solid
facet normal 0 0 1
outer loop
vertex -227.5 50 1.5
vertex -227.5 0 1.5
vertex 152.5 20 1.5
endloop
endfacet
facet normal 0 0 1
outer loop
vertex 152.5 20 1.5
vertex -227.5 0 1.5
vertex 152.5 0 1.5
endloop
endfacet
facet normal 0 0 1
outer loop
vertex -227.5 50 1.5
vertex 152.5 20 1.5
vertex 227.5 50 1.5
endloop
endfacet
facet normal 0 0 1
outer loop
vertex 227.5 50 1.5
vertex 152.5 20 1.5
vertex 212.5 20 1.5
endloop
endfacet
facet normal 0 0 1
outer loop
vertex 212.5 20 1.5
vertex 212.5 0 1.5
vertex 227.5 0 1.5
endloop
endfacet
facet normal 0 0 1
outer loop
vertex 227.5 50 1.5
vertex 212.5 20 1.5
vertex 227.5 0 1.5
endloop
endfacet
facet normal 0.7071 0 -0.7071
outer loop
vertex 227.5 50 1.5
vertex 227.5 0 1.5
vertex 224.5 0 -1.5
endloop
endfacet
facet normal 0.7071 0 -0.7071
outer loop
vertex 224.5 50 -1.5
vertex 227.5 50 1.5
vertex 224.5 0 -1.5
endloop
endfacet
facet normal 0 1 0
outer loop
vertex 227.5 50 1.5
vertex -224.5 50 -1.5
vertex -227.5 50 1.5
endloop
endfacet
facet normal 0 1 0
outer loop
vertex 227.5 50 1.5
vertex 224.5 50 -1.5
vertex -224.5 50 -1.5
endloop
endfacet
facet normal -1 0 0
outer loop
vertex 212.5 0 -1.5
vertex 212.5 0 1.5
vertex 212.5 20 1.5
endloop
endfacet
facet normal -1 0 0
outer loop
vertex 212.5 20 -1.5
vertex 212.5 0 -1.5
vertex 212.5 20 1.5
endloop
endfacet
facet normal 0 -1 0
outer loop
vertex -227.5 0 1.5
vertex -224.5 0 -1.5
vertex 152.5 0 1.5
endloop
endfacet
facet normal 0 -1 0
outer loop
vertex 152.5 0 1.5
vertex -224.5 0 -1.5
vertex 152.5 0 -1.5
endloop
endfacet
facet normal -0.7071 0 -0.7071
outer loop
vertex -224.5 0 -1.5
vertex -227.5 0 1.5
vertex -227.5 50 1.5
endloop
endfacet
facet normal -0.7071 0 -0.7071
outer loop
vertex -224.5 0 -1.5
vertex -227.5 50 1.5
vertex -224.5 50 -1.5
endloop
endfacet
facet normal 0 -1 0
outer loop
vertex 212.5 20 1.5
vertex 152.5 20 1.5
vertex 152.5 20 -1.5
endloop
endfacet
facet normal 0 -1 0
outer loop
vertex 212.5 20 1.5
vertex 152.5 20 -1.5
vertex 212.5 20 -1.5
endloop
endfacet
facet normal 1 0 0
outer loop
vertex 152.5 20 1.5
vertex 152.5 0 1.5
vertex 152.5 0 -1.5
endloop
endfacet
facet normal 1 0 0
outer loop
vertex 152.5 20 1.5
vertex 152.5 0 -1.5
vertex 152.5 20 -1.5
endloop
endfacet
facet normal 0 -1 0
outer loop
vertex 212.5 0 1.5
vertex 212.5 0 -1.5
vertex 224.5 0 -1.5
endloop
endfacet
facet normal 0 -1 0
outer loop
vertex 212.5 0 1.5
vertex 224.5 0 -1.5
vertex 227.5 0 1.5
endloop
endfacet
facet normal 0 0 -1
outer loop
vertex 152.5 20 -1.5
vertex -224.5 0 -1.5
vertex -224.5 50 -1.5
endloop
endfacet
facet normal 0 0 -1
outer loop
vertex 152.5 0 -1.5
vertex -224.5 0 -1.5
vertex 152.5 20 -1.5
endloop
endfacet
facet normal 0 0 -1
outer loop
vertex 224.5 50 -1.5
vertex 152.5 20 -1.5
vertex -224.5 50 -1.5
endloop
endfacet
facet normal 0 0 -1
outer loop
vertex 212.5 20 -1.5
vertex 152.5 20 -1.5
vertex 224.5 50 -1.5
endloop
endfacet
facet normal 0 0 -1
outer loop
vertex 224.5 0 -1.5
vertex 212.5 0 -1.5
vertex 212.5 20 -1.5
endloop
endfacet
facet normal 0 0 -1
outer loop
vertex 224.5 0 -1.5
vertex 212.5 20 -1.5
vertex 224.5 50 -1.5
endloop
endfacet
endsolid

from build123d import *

# Parameters (mm, degrees)
SKETCH1_W           = 455
SKETCH1_H           = 3
BOSS_EXTRUDE1_DEPTH = 50
SKETCH2_W           = 60
SKETCH2_H           = 20
CUT_EXTRUDE1_DEPTH  = 55
CUT_EXTRUDE2_DEPTH  = 233.934540161


with BuildPart() as part:
    # Sketch1 → Boss-Extrude1 (new body)
    with BuildSketch(Plane(origin=(0, 0, 0), x_dir=(1, 0, 0), z_dir=(0, 1, 0))):
        Rectangle(SKETCH1_W, SKETCH1_H)
    extrude(amount=BOSS_EXTRUDE1_DEPTH)

    # Sketch2 → Cut-Extrude1 (cut)
    with BuildSketch(Plane.XY.offset(1.5)):
        with Locations((182.5, 10)):
            Rectangle(SKETCH2_W, SKETCH2_H)
    extrude(amount=-CUT_EXTRUDE1_DEPTH, mode=Mode.SUBTRACT)

    # Sketch3 → Cut-Extrude2 (cut, through all)
    with BuildSketch(Plane(origin=(0, 50, 0), x_dir=(1, 0, 0), z_dir=(0, 1, 0))):
        Polygon((-227.5, 1.5), (-227.5, -1.5), (-224.5, 1.5), align=None)
        Polygon((227.5, 1.5), (227.5, -1.5), (224.5, 1.5), align=None)
    extrude(amount=-CUT_EXTRUDE2_DEPTH, mode=Mode.SUBTRACT)


solid = part.part
